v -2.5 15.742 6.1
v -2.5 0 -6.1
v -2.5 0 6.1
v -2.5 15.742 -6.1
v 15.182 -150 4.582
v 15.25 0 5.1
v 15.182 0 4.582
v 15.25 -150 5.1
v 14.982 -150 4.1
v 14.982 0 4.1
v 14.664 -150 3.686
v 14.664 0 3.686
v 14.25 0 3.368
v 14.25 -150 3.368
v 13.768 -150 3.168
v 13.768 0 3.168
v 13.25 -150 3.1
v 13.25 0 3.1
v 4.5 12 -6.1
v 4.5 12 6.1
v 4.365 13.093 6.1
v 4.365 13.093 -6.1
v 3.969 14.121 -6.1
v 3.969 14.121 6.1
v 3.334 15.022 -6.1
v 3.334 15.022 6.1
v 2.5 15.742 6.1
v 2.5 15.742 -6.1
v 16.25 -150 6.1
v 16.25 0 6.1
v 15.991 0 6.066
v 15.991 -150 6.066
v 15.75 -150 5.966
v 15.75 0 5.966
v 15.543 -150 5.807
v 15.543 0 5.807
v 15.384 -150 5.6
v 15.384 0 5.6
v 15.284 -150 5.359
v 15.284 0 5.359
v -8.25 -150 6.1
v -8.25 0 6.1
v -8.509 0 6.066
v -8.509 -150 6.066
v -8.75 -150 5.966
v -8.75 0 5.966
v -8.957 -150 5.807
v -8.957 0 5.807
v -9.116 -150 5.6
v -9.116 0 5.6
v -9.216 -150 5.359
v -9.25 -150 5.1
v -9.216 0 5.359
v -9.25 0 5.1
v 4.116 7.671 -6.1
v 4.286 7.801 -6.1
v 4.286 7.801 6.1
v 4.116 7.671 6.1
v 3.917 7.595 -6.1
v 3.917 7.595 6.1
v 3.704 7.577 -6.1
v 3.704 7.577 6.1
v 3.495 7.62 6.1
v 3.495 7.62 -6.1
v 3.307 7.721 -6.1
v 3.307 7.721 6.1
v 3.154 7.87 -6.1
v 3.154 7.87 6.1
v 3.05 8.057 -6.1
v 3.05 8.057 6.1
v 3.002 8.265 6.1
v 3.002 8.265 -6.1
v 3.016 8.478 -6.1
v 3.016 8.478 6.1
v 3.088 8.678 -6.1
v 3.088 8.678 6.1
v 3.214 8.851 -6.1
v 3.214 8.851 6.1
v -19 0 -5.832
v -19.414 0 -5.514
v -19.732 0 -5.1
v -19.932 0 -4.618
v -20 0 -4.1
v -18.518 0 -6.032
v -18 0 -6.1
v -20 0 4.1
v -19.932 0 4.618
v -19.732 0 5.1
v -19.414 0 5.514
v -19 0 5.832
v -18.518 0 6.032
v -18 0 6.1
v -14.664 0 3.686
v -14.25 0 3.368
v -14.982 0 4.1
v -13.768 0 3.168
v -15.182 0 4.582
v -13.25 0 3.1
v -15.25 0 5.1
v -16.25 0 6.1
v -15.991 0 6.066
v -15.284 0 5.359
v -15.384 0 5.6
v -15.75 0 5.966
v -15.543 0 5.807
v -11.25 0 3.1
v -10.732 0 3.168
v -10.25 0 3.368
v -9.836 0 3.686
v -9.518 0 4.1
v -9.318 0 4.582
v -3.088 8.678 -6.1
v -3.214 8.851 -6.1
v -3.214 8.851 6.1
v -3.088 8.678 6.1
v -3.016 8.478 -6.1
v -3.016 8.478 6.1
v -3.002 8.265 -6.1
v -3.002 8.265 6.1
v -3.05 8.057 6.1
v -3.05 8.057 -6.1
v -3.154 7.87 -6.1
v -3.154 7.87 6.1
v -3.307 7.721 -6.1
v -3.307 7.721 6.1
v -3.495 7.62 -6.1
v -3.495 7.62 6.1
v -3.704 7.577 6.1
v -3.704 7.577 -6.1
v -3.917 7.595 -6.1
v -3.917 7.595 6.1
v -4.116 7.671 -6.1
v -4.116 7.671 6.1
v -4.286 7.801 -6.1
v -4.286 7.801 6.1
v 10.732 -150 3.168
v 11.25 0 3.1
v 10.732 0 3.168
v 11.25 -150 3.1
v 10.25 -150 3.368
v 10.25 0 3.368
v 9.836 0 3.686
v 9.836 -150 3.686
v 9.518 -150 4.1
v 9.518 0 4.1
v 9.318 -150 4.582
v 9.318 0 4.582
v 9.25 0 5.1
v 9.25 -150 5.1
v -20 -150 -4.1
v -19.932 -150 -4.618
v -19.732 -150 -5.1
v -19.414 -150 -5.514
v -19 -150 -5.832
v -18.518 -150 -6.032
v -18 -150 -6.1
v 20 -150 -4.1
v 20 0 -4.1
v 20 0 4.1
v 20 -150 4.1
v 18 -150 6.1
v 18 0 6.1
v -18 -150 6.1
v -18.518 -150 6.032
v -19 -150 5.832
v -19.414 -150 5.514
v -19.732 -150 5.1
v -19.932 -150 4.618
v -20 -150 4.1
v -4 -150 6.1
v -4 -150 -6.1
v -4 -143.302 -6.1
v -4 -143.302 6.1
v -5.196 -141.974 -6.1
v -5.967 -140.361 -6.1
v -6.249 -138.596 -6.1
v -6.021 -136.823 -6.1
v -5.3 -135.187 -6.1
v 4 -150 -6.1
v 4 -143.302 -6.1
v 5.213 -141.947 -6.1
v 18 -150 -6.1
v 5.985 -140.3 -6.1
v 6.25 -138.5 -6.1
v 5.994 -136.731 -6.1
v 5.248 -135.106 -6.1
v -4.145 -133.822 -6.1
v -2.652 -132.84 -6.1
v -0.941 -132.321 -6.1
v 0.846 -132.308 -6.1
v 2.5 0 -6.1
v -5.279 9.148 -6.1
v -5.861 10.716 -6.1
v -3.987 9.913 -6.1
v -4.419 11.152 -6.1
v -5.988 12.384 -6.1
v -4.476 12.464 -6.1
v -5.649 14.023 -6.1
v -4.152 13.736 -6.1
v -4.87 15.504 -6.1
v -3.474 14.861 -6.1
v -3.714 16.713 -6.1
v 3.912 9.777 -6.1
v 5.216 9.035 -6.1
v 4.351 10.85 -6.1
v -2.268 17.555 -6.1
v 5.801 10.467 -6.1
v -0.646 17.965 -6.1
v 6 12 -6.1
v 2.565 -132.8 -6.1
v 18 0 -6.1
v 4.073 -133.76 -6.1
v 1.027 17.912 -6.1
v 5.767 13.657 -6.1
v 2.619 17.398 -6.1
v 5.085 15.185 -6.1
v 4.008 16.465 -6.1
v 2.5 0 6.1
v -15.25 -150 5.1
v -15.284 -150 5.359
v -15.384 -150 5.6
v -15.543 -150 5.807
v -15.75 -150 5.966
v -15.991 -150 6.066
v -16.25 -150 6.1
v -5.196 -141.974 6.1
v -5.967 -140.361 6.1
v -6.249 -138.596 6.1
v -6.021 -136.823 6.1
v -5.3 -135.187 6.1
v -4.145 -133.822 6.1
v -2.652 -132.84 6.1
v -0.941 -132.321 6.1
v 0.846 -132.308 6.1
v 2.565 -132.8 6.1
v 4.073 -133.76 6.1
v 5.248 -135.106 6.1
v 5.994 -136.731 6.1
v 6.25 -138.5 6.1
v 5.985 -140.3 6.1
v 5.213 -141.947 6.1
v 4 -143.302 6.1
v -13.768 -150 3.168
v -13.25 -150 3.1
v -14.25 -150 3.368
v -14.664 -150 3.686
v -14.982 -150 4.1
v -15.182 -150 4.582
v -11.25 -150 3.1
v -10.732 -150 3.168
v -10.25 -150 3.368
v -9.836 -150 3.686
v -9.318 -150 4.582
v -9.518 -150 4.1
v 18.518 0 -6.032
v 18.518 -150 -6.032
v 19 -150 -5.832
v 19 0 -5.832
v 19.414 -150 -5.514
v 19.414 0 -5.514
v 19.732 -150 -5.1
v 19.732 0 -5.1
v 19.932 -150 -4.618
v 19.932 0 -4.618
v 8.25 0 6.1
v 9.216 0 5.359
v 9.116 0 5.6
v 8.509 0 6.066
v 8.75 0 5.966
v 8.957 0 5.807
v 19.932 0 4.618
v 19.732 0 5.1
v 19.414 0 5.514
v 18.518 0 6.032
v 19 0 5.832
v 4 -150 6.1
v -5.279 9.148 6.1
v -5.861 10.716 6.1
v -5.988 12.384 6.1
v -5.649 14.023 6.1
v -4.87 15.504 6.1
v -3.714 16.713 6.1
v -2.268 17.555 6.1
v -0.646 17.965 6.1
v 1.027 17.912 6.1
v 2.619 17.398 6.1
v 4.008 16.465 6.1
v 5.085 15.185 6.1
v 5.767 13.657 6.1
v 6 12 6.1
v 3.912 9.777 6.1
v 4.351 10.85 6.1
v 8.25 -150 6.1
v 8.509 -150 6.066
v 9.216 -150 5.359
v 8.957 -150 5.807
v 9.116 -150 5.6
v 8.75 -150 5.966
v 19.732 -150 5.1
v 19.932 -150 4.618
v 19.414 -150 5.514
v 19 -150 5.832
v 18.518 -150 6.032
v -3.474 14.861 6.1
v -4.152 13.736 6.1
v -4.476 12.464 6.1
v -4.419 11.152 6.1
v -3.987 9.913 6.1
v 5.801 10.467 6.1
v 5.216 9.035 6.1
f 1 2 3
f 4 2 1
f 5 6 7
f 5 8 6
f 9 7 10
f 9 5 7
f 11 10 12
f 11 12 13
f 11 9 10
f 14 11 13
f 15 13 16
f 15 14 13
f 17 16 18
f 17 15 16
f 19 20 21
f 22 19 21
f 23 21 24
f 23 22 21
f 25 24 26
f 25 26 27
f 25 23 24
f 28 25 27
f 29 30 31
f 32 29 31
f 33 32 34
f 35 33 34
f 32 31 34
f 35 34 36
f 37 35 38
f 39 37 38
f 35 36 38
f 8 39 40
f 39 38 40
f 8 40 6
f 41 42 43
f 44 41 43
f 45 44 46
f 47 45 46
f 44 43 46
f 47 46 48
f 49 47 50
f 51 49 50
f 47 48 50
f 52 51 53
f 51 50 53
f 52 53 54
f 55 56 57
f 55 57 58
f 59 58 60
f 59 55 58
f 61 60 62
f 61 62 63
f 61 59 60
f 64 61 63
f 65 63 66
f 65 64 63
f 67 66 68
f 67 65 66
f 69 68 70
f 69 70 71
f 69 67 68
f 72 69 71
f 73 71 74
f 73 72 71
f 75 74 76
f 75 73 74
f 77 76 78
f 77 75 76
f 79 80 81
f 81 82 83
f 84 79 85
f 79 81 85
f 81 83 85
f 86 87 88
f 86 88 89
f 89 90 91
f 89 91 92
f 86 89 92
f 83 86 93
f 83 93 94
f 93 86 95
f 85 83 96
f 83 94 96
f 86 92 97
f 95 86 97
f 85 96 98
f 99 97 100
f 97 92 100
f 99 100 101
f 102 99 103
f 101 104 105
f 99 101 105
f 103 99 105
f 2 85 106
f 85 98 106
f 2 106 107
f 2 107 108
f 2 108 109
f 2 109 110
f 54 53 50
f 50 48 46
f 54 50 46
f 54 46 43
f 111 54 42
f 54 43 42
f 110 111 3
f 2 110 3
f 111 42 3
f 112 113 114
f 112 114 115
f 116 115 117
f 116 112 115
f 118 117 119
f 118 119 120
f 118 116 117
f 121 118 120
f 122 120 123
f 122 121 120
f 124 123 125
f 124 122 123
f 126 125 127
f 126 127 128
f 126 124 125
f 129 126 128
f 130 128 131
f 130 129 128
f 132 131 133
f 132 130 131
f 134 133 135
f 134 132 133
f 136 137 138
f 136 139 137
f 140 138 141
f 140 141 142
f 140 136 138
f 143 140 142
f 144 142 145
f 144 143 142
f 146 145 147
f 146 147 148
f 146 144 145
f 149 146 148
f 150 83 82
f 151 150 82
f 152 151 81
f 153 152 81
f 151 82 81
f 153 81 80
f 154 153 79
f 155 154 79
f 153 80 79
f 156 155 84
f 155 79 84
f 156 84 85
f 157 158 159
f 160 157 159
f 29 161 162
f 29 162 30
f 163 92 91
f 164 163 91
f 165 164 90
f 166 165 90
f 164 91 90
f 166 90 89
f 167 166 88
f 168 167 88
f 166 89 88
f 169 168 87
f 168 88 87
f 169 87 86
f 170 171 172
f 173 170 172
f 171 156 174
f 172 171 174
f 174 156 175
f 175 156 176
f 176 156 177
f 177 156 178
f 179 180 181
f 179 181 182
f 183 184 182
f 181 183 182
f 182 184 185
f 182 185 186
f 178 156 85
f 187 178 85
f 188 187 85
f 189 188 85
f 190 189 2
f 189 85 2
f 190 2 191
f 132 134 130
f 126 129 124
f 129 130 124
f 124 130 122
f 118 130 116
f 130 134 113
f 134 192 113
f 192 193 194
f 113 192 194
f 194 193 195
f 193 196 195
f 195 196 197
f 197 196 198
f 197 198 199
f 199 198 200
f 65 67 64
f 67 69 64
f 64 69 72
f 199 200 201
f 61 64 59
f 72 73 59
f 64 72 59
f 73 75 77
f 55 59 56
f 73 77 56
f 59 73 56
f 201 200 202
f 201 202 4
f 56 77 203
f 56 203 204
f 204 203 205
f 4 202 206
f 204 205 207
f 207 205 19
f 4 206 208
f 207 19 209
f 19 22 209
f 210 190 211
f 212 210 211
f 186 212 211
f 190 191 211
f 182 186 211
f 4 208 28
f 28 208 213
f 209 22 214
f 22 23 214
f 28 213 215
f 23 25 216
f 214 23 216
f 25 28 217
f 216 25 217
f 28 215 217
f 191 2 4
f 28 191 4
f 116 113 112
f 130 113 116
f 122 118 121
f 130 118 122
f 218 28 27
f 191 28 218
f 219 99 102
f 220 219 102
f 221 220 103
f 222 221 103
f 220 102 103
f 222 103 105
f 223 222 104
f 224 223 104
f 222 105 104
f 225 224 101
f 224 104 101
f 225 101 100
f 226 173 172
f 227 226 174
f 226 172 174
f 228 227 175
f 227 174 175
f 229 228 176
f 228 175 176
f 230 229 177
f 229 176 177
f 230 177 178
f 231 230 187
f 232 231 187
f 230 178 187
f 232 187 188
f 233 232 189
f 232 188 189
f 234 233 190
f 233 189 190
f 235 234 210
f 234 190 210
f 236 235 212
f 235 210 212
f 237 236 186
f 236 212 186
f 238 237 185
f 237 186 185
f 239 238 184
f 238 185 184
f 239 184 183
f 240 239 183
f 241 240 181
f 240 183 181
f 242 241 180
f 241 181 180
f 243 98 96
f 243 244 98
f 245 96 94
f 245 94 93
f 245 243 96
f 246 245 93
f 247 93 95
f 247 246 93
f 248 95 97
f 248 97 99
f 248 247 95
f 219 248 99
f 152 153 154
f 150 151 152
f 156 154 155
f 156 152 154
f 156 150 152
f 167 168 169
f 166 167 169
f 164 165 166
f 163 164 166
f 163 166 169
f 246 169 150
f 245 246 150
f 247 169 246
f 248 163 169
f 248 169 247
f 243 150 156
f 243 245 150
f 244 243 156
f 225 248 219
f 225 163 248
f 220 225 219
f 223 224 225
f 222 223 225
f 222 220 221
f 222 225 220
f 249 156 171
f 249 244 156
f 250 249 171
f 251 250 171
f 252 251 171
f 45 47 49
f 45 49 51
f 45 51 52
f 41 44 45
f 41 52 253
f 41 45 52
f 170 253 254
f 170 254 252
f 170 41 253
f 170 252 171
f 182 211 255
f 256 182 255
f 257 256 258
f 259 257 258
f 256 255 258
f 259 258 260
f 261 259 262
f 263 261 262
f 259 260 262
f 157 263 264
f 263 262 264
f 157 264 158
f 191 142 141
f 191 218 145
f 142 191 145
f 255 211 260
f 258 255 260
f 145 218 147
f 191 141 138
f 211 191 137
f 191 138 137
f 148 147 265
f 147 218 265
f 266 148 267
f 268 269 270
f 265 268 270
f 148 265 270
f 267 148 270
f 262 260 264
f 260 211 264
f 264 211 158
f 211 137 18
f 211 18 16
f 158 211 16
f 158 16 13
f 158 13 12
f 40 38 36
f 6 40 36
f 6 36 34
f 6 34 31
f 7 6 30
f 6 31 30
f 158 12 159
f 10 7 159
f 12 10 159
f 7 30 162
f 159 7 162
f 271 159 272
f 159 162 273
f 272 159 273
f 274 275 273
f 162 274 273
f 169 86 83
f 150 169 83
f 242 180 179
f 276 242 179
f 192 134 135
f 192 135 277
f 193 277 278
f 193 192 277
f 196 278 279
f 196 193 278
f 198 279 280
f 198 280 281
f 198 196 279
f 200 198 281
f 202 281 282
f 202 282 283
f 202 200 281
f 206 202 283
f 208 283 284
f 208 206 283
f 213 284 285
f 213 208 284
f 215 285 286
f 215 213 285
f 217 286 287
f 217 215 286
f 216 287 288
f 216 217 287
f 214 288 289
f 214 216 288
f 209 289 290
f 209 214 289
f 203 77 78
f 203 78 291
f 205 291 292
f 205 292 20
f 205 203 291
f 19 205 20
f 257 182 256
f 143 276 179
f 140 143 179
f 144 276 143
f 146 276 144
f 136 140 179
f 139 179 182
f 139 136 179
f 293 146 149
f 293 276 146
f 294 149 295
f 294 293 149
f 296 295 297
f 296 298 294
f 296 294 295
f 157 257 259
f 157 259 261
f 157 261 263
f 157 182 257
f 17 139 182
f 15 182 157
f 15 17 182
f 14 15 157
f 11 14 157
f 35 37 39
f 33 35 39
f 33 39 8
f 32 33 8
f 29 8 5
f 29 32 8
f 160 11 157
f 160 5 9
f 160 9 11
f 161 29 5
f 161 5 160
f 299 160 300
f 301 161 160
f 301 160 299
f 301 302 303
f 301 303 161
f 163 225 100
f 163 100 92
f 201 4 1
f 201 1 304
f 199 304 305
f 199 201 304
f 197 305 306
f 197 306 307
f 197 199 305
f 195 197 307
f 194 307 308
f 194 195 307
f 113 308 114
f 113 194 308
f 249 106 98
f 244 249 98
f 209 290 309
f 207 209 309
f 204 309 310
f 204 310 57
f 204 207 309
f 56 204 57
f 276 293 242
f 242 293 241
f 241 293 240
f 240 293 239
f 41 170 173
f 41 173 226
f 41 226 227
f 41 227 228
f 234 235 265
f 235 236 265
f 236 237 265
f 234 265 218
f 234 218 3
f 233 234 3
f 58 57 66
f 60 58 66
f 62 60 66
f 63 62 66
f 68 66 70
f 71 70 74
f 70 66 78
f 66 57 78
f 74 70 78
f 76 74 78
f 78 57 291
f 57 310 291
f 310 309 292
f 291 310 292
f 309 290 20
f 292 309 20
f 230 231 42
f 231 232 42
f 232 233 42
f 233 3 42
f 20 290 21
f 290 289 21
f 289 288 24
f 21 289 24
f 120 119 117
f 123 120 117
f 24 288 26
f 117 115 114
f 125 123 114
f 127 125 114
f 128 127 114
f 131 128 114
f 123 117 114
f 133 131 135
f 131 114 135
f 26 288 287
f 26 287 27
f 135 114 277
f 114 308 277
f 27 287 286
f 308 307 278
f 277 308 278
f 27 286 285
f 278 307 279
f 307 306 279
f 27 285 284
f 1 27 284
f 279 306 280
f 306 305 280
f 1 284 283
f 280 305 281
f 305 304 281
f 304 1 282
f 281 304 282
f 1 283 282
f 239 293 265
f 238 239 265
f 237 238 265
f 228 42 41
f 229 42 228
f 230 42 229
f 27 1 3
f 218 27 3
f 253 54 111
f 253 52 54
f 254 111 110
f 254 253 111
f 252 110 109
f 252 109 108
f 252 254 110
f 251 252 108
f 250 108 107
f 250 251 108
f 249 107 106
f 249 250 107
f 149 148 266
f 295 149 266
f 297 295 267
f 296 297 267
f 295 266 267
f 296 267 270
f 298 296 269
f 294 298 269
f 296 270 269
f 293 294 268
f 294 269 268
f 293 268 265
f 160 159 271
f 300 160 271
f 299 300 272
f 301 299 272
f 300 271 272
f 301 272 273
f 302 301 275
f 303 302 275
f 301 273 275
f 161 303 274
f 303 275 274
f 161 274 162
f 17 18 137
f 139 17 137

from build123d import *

# Parameters (mm, degrees)
F1_DEPTH = 150
F2_R     = 1.99999
F4_DEPTH = 12.2
F5_DEPTH = 25


# Not quite as in the source:
# - a fillet or chamfer is up to 0.001 mm smaller than in the source, because OpenCascade refuses the exact size


with BuildPart() as f1:
    # F0 (on Front) → F1 (new body)
    with BuildSketch(Plane.XZ):
        with BuildLine():
            ThreePointArc((20, 4.1), (19.4142135624, 5.5142135624), (18, 6.1))
            Line((18, 6.1), (16.25, 6.1))
            ThreePointArc((16.25, 6.1), (15.5428932188, 5.8071067812), (15.25, 5.1))
            Line((15.25, 5.1), (15.25, 3.1))
            Line((15.25, 3.1), (9.25, 3.1))
            Line((9.25, 3.1), (9.25, 5.1))
            ThreePointArc((9.25, 5.1), (8.9571067812, 5.8071067812), (8.25, 6.1))
            Line((8.25, 6.1), (-8.25, 6.1))
            ThreePointArc((-8.25, 6.1), (-8.9571067812, 5.8071067812), (-9.25, 5.1))
            Line((-9.25, 5.1), (-9.25, 3.1))
            Line((-9.25, 3.1), (-15.25, 3.1))
            Line((-15.25, 3.1), (-15.25, 5.1))
            ThreePointArc((-15.25, 5.1), (-15.5428932188, 5.8071067812), (-16.25, 6.1))
            Line((-16.25, 6.1), (-18, 6.1))
            ThreePointArc((-18, 6.1), (-19.4142135624, 5.5142135624), (-20, 4.1))
            Line((-20, 4.1), (-20, -4.1))
            ThreePointArc((-20, -4.1), (-19.4142135624, -5.5142135624), (-18, -6.1))
            Line((-18, -6.1), (18, -6.1))
            ThreePointArc((18, -6.1), (19.4142135624, -5.5142135624), (20, -4.1))
            Line((20, -4.1), (20, 4.1))
        make_face()
    extrude(amount=F1_DEPTH)

    # F2 (radius 2 in the source; OpenCascade refuses exactly that, so slightly less here)
    f2_edges = [f1.edges().sort_by_distance(p)[0] for p in [
        (15.25, -75, 3.1),
        (9.25, -75, 3.1),
        (-9.25, -75, 3.1),
        (-15.25, -75, 3.1),
    ]]
    fillet(f2_edges, radius=F2_R)

    # F3 (on face) → F4 (join)
    with BuildSketch(Plane(origin=(0, 0, -6.1), x_dir=(1, 0, 0), z_dir=(0, 0, -1))):
        with BuildLine():
            Line((0, 0), (-2.5, 0))
            Line((-2.5, 0), (-2.5, -6.5456439427))
            ThreePointArc((-2.5, -6.5456439427), (-1.2794263668, -6.1379979383), (0, -6))
            Line((0, -6), (0, 0))
        make_face()
        with BuildLine():
            Line((2.5, -6.5456439427), (2.5, 0))
            Line((2.5, 0), (0, 0))
            Line((0, 0), (0, -6))
            ThreePointArc((0, -6), (1.2794263668, -6.1379979383), (2.5, -6.5456439427))
        make_face()
        with BuildLine():
            Line((2.5, -8.2583426132), (2.5, -6.5456439427))
            ThreePointArc((2.5, -6.5456439427), (1.2794263668, -6.1379979383), (0, -6))
            Line((0, -6), (0, -7.5))
            ThreePointArc((0, -7.5), (1.3062430401, -7.6937569599), (2.5, -8.2583426132))
        make_face()
        with BuildLine():
            ThreePointArc((0, -6), (-1.2794263668, -6.1379979383), (-2.5, -6.5456439427))
            Line((-2.5, -6.5456439427), (-2.5, -8.2583426132))
            ThreePointArc((-2.5, -8.2583426132), (-1.3062430401, -7.6937569599), (0, -7.5))
            Line((0, -7.5), (0, -6))
        make_face()
        with BuildLine():
            Line((2.5, -15.7416573868), (2.5, -8.2583426132))
            ThreePointArc((2.5, -8.2583426132), (1.3062430401, -7.6937569599), (0, -7.5))
            ThreePointArc((0, -7.5), (-1.3062430401, -7.6937569599), (-2.5, -8.2583426132))
            Line((-2.5, -8.2583426132), (-2.5, -15.7416573868))
            ThreePointArc((-2.5, -15.7416573868), (0, -16.5), (2.5, -15.7416573868))
        make_face()
        with BuildLine():
            ThreePointArc((6, -12), (5.5549205986, -9.7322131619), (4.2857142857, -7.8008747267))
            ThreePointArc((4.2857142857, -7.8008747267), (3.2251093408, -7.7900511001), (3.2142857143, -8.850656045))
            ThreePointArc((3.2142857143, -8.850656045), (4.166190449, -10.2991598715), (4.5, -12))
            ThreePointArc((4.5, -12), (3.9686269666, -14.1213203436), (2.5, -15.7416573868))
            ThreePointArc((2.5, -15.7416573868), (0, -16.5), (-2.5, -15.7416573868))
            ThreePointArc((-2.5, -15.7416573868), (-4.4760183399, -12.4639610121), (-3.2142857143, -8.850656045))
            ThreePointArc((-3.2142857143, -8.850656045), (-3.2251093408, -7.7900511001), (-4.2857142857, -7.8008747267))
            ThreePointArc((-4.2857142857, -7.8008747267), (-2.2677868381, -17.5549205986), (6, -12))
        make_face()
    extrude(amount=-F4_DEPTH)

    # F3 (on face) → F5 (cut)
    with BuildSketch(Plane(origin=(0, 0, -6.1), x_dir=(1, 0, 0), z_dir=(0, 0, -1))):
        with BuildLine():
            ThreePointArc((-4, 143.3023431781), (0, 144.75), (4, 143.3023431781))
            Line((4, 143.3023431781), (4, 150))
            Line((4, 150), (-4, 150))
            Line((-4, 150), (-4, 143.3023431781))
        make_face()
        with BuildLine():
            ThreePointArc((-4, 143.3023431781), (-2.6516504294, 132.8403842887), (6.25, 138.5))
            ThreePointArc((6.25, 138.5), (5.6596157113, 141.1516504294), (4, 143.3023431781))
            ThreePointArc((4, 143.3023431781), (0, 144.75), (-4, 143.3023431781))
        make_face()
    extrude(amount=-F5_DEPTH, mode=Mode.SUBTRACT)


solid = f1.part
